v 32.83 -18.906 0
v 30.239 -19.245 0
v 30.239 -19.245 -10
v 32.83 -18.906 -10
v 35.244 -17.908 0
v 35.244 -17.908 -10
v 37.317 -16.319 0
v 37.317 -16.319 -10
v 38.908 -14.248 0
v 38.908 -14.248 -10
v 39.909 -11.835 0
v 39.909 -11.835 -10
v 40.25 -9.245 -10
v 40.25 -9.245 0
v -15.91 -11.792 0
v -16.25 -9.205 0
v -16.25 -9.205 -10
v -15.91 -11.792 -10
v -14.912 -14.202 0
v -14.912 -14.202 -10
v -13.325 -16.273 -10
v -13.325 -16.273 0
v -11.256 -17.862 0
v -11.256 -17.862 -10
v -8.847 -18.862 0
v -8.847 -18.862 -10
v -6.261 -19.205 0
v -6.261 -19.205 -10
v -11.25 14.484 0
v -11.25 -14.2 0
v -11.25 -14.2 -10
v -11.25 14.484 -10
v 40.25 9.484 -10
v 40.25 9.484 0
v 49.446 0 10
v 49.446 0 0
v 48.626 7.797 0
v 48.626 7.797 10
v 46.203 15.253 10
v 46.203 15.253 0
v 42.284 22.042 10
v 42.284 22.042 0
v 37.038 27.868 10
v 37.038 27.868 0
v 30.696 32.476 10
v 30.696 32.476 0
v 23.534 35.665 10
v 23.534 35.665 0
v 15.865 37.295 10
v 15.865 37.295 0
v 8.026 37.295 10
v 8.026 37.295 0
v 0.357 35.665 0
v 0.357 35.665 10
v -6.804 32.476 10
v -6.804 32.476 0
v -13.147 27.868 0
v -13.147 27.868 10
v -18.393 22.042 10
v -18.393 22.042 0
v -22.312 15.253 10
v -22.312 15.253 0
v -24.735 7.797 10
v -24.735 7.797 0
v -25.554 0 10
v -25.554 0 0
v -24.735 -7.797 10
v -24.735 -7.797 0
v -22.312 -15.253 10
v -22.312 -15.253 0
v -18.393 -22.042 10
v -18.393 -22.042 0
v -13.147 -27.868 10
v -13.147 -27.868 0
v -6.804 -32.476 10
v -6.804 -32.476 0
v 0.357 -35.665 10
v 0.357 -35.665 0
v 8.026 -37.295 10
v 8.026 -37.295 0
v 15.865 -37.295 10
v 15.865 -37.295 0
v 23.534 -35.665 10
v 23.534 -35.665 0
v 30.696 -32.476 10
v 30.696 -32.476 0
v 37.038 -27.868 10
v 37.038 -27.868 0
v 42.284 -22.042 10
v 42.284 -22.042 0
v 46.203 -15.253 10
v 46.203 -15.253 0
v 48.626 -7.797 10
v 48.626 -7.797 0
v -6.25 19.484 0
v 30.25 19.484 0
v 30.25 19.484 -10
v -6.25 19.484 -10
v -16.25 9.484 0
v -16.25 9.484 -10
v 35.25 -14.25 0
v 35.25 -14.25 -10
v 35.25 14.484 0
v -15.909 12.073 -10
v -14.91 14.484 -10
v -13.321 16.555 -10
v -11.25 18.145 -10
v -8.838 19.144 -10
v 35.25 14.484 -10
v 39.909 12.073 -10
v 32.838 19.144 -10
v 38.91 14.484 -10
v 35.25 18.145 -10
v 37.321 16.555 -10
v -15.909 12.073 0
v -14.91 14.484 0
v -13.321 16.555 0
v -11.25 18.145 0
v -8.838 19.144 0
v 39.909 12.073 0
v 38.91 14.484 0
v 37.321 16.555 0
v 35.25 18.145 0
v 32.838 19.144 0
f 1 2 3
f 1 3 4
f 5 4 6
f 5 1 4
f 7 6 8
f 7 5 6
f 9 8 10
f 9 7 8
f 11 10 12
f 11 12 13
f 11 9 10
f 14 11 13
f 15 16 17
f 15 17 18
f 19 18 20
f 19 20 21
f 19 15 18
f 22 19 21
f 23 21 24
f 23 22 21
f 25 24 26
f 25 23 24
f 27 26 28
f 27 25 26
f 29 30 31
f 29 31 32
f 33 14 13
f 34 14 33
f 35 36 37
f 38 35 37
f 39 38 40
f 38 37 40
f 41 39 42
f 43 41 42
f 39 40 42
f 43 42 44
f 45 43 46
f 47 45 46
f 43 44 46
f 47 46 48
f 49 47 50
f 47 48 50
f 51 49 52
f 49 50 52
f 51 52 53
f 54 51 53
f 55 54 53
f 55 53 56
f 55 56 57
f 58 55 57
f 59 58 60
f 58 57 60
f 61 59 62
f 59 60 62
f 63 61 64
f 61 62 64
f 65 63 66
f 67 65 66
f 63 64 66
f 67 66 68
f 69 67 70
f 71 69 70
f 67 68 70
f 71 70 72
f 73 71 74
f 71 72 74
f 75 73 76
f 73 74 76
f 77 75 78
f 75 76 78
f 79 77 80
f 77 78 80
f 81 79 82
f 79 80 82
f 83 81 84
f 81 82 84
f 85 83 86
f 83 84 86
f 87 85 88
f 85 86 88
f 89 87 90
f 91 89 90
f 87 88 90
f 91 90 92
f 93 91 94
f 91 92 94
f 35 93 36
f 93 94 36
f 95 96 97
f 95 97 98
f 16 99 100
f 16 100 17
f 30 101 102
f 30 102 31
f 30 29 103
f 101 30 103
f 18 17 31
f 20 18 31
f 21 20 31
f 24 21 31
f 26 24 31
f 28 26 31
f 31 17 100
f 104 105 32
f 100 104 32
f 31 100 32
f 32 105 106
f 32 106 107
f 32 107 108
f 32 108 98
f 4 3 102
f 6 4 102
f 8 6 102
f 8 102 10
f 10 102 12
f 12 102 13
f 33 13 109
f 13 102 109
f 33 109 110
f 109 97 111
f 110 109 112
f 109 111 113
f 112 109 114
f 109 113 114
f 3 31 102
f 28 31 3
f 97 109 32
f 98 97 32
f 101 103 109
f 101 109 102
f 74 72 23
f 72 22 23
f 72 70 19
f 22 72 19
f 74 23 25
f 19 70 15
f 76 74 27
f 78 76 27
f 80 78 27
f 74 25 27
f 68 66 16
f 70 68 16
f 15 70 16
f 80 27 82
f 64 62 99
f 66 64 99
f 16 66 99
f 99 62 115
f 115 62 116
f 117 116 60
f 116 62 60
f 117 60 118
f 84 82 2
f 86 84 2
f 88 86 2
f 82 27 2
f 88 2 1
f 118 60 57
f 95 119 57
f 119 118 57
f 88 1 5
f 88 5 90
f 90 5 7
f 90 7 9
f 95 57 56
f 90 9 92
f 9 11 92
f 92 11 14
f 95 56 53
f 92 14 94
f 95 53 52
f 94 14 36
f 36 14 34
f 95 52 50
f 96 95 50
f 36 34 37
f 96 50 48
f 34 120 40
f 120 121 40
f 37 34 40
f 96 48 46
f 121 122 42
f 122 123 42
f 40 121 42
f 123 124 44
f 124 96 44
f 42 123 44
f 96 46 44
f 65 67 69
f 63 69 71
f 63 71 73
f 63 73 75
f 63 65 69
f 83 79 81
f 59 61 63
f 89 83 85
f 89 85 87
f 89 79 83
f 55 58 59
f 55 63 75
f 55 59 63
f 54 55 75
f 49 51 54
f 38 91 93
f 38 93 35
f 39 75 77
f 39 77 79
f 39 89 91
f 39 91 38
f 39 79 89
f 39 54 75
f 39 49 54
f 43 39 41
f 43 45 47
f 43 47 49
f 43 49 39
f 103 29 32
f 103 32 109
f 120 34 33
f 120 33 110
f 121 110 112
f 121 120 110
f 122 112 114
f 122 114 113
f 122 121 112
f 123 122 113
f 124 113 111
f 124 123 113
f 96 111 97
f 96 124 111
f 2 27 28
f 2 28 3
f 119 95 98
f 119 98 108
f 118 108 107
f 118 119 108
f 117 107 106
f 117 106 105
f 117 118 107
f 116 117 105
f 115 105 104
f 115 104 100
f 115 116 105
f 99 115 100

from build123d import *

# Parameters (mm, degrees)
SKETCH1_R           = 37.5
BOSS_EXTRUDE1_DEPTH = 10
BOSS_EXTRUDE2_DEPTH = 10


with BuildPart() as part:
    # Sketch1 → Boss-Extrude1 (new body)
    with BuildSketch(Plane.XY):
        with Locations((11.945516858, 0)):
            Circle(SKETCH1_R)
    extrude(amount=BOSS_EXTRUDE1_DEPTH)

    # Sketch2 → Boss-Extrude2 (add)
    with BuildSketch(Plane(origin=(0, 0, 0), x_dir=(-1, 0, 0), z_dir=(0, 0, -1))):
        with BuildLine():
            Line((-30.25, 19.484324941), (6.25, 19.484324941))
            ThreePointArc((6.25, 19.484324941), (13.321067812, 16.555392753), (16.25, 9.484324941))
            Line((16.25, 9.484324941), (16.25, -9.205373472))
            ThreePointArc((16.25, -9.205373472), (13.324868437, -16.272638614), (6.260752682, -19.205367691))
            Line((6.260752682, -19.205367691), (-30.239247318, -19.244615001))
            ThreePointArc((-30.239247318, -19.244615001), (-37.317265142, -16.319489219), (-40.25, -9.244620782))
            Line((-40.25, -9.244620782), (-40.25, 9.484324941))
            ThreePointArc((-40.25, 9.484324941), (-37.321067812, 16.555392753), (-30.25, 19.484324941))
        make_face()
        Polygon((-35.25, -14.250000016), (11.25, -14.200000018), (11.25, 14.484324941), (-35.25, 14.484324941), align=None, mode=Mode.SUBTRACT)
    extrude(amount=BOSS_EXTRUDE2_DEPTH)


solid = part.part
